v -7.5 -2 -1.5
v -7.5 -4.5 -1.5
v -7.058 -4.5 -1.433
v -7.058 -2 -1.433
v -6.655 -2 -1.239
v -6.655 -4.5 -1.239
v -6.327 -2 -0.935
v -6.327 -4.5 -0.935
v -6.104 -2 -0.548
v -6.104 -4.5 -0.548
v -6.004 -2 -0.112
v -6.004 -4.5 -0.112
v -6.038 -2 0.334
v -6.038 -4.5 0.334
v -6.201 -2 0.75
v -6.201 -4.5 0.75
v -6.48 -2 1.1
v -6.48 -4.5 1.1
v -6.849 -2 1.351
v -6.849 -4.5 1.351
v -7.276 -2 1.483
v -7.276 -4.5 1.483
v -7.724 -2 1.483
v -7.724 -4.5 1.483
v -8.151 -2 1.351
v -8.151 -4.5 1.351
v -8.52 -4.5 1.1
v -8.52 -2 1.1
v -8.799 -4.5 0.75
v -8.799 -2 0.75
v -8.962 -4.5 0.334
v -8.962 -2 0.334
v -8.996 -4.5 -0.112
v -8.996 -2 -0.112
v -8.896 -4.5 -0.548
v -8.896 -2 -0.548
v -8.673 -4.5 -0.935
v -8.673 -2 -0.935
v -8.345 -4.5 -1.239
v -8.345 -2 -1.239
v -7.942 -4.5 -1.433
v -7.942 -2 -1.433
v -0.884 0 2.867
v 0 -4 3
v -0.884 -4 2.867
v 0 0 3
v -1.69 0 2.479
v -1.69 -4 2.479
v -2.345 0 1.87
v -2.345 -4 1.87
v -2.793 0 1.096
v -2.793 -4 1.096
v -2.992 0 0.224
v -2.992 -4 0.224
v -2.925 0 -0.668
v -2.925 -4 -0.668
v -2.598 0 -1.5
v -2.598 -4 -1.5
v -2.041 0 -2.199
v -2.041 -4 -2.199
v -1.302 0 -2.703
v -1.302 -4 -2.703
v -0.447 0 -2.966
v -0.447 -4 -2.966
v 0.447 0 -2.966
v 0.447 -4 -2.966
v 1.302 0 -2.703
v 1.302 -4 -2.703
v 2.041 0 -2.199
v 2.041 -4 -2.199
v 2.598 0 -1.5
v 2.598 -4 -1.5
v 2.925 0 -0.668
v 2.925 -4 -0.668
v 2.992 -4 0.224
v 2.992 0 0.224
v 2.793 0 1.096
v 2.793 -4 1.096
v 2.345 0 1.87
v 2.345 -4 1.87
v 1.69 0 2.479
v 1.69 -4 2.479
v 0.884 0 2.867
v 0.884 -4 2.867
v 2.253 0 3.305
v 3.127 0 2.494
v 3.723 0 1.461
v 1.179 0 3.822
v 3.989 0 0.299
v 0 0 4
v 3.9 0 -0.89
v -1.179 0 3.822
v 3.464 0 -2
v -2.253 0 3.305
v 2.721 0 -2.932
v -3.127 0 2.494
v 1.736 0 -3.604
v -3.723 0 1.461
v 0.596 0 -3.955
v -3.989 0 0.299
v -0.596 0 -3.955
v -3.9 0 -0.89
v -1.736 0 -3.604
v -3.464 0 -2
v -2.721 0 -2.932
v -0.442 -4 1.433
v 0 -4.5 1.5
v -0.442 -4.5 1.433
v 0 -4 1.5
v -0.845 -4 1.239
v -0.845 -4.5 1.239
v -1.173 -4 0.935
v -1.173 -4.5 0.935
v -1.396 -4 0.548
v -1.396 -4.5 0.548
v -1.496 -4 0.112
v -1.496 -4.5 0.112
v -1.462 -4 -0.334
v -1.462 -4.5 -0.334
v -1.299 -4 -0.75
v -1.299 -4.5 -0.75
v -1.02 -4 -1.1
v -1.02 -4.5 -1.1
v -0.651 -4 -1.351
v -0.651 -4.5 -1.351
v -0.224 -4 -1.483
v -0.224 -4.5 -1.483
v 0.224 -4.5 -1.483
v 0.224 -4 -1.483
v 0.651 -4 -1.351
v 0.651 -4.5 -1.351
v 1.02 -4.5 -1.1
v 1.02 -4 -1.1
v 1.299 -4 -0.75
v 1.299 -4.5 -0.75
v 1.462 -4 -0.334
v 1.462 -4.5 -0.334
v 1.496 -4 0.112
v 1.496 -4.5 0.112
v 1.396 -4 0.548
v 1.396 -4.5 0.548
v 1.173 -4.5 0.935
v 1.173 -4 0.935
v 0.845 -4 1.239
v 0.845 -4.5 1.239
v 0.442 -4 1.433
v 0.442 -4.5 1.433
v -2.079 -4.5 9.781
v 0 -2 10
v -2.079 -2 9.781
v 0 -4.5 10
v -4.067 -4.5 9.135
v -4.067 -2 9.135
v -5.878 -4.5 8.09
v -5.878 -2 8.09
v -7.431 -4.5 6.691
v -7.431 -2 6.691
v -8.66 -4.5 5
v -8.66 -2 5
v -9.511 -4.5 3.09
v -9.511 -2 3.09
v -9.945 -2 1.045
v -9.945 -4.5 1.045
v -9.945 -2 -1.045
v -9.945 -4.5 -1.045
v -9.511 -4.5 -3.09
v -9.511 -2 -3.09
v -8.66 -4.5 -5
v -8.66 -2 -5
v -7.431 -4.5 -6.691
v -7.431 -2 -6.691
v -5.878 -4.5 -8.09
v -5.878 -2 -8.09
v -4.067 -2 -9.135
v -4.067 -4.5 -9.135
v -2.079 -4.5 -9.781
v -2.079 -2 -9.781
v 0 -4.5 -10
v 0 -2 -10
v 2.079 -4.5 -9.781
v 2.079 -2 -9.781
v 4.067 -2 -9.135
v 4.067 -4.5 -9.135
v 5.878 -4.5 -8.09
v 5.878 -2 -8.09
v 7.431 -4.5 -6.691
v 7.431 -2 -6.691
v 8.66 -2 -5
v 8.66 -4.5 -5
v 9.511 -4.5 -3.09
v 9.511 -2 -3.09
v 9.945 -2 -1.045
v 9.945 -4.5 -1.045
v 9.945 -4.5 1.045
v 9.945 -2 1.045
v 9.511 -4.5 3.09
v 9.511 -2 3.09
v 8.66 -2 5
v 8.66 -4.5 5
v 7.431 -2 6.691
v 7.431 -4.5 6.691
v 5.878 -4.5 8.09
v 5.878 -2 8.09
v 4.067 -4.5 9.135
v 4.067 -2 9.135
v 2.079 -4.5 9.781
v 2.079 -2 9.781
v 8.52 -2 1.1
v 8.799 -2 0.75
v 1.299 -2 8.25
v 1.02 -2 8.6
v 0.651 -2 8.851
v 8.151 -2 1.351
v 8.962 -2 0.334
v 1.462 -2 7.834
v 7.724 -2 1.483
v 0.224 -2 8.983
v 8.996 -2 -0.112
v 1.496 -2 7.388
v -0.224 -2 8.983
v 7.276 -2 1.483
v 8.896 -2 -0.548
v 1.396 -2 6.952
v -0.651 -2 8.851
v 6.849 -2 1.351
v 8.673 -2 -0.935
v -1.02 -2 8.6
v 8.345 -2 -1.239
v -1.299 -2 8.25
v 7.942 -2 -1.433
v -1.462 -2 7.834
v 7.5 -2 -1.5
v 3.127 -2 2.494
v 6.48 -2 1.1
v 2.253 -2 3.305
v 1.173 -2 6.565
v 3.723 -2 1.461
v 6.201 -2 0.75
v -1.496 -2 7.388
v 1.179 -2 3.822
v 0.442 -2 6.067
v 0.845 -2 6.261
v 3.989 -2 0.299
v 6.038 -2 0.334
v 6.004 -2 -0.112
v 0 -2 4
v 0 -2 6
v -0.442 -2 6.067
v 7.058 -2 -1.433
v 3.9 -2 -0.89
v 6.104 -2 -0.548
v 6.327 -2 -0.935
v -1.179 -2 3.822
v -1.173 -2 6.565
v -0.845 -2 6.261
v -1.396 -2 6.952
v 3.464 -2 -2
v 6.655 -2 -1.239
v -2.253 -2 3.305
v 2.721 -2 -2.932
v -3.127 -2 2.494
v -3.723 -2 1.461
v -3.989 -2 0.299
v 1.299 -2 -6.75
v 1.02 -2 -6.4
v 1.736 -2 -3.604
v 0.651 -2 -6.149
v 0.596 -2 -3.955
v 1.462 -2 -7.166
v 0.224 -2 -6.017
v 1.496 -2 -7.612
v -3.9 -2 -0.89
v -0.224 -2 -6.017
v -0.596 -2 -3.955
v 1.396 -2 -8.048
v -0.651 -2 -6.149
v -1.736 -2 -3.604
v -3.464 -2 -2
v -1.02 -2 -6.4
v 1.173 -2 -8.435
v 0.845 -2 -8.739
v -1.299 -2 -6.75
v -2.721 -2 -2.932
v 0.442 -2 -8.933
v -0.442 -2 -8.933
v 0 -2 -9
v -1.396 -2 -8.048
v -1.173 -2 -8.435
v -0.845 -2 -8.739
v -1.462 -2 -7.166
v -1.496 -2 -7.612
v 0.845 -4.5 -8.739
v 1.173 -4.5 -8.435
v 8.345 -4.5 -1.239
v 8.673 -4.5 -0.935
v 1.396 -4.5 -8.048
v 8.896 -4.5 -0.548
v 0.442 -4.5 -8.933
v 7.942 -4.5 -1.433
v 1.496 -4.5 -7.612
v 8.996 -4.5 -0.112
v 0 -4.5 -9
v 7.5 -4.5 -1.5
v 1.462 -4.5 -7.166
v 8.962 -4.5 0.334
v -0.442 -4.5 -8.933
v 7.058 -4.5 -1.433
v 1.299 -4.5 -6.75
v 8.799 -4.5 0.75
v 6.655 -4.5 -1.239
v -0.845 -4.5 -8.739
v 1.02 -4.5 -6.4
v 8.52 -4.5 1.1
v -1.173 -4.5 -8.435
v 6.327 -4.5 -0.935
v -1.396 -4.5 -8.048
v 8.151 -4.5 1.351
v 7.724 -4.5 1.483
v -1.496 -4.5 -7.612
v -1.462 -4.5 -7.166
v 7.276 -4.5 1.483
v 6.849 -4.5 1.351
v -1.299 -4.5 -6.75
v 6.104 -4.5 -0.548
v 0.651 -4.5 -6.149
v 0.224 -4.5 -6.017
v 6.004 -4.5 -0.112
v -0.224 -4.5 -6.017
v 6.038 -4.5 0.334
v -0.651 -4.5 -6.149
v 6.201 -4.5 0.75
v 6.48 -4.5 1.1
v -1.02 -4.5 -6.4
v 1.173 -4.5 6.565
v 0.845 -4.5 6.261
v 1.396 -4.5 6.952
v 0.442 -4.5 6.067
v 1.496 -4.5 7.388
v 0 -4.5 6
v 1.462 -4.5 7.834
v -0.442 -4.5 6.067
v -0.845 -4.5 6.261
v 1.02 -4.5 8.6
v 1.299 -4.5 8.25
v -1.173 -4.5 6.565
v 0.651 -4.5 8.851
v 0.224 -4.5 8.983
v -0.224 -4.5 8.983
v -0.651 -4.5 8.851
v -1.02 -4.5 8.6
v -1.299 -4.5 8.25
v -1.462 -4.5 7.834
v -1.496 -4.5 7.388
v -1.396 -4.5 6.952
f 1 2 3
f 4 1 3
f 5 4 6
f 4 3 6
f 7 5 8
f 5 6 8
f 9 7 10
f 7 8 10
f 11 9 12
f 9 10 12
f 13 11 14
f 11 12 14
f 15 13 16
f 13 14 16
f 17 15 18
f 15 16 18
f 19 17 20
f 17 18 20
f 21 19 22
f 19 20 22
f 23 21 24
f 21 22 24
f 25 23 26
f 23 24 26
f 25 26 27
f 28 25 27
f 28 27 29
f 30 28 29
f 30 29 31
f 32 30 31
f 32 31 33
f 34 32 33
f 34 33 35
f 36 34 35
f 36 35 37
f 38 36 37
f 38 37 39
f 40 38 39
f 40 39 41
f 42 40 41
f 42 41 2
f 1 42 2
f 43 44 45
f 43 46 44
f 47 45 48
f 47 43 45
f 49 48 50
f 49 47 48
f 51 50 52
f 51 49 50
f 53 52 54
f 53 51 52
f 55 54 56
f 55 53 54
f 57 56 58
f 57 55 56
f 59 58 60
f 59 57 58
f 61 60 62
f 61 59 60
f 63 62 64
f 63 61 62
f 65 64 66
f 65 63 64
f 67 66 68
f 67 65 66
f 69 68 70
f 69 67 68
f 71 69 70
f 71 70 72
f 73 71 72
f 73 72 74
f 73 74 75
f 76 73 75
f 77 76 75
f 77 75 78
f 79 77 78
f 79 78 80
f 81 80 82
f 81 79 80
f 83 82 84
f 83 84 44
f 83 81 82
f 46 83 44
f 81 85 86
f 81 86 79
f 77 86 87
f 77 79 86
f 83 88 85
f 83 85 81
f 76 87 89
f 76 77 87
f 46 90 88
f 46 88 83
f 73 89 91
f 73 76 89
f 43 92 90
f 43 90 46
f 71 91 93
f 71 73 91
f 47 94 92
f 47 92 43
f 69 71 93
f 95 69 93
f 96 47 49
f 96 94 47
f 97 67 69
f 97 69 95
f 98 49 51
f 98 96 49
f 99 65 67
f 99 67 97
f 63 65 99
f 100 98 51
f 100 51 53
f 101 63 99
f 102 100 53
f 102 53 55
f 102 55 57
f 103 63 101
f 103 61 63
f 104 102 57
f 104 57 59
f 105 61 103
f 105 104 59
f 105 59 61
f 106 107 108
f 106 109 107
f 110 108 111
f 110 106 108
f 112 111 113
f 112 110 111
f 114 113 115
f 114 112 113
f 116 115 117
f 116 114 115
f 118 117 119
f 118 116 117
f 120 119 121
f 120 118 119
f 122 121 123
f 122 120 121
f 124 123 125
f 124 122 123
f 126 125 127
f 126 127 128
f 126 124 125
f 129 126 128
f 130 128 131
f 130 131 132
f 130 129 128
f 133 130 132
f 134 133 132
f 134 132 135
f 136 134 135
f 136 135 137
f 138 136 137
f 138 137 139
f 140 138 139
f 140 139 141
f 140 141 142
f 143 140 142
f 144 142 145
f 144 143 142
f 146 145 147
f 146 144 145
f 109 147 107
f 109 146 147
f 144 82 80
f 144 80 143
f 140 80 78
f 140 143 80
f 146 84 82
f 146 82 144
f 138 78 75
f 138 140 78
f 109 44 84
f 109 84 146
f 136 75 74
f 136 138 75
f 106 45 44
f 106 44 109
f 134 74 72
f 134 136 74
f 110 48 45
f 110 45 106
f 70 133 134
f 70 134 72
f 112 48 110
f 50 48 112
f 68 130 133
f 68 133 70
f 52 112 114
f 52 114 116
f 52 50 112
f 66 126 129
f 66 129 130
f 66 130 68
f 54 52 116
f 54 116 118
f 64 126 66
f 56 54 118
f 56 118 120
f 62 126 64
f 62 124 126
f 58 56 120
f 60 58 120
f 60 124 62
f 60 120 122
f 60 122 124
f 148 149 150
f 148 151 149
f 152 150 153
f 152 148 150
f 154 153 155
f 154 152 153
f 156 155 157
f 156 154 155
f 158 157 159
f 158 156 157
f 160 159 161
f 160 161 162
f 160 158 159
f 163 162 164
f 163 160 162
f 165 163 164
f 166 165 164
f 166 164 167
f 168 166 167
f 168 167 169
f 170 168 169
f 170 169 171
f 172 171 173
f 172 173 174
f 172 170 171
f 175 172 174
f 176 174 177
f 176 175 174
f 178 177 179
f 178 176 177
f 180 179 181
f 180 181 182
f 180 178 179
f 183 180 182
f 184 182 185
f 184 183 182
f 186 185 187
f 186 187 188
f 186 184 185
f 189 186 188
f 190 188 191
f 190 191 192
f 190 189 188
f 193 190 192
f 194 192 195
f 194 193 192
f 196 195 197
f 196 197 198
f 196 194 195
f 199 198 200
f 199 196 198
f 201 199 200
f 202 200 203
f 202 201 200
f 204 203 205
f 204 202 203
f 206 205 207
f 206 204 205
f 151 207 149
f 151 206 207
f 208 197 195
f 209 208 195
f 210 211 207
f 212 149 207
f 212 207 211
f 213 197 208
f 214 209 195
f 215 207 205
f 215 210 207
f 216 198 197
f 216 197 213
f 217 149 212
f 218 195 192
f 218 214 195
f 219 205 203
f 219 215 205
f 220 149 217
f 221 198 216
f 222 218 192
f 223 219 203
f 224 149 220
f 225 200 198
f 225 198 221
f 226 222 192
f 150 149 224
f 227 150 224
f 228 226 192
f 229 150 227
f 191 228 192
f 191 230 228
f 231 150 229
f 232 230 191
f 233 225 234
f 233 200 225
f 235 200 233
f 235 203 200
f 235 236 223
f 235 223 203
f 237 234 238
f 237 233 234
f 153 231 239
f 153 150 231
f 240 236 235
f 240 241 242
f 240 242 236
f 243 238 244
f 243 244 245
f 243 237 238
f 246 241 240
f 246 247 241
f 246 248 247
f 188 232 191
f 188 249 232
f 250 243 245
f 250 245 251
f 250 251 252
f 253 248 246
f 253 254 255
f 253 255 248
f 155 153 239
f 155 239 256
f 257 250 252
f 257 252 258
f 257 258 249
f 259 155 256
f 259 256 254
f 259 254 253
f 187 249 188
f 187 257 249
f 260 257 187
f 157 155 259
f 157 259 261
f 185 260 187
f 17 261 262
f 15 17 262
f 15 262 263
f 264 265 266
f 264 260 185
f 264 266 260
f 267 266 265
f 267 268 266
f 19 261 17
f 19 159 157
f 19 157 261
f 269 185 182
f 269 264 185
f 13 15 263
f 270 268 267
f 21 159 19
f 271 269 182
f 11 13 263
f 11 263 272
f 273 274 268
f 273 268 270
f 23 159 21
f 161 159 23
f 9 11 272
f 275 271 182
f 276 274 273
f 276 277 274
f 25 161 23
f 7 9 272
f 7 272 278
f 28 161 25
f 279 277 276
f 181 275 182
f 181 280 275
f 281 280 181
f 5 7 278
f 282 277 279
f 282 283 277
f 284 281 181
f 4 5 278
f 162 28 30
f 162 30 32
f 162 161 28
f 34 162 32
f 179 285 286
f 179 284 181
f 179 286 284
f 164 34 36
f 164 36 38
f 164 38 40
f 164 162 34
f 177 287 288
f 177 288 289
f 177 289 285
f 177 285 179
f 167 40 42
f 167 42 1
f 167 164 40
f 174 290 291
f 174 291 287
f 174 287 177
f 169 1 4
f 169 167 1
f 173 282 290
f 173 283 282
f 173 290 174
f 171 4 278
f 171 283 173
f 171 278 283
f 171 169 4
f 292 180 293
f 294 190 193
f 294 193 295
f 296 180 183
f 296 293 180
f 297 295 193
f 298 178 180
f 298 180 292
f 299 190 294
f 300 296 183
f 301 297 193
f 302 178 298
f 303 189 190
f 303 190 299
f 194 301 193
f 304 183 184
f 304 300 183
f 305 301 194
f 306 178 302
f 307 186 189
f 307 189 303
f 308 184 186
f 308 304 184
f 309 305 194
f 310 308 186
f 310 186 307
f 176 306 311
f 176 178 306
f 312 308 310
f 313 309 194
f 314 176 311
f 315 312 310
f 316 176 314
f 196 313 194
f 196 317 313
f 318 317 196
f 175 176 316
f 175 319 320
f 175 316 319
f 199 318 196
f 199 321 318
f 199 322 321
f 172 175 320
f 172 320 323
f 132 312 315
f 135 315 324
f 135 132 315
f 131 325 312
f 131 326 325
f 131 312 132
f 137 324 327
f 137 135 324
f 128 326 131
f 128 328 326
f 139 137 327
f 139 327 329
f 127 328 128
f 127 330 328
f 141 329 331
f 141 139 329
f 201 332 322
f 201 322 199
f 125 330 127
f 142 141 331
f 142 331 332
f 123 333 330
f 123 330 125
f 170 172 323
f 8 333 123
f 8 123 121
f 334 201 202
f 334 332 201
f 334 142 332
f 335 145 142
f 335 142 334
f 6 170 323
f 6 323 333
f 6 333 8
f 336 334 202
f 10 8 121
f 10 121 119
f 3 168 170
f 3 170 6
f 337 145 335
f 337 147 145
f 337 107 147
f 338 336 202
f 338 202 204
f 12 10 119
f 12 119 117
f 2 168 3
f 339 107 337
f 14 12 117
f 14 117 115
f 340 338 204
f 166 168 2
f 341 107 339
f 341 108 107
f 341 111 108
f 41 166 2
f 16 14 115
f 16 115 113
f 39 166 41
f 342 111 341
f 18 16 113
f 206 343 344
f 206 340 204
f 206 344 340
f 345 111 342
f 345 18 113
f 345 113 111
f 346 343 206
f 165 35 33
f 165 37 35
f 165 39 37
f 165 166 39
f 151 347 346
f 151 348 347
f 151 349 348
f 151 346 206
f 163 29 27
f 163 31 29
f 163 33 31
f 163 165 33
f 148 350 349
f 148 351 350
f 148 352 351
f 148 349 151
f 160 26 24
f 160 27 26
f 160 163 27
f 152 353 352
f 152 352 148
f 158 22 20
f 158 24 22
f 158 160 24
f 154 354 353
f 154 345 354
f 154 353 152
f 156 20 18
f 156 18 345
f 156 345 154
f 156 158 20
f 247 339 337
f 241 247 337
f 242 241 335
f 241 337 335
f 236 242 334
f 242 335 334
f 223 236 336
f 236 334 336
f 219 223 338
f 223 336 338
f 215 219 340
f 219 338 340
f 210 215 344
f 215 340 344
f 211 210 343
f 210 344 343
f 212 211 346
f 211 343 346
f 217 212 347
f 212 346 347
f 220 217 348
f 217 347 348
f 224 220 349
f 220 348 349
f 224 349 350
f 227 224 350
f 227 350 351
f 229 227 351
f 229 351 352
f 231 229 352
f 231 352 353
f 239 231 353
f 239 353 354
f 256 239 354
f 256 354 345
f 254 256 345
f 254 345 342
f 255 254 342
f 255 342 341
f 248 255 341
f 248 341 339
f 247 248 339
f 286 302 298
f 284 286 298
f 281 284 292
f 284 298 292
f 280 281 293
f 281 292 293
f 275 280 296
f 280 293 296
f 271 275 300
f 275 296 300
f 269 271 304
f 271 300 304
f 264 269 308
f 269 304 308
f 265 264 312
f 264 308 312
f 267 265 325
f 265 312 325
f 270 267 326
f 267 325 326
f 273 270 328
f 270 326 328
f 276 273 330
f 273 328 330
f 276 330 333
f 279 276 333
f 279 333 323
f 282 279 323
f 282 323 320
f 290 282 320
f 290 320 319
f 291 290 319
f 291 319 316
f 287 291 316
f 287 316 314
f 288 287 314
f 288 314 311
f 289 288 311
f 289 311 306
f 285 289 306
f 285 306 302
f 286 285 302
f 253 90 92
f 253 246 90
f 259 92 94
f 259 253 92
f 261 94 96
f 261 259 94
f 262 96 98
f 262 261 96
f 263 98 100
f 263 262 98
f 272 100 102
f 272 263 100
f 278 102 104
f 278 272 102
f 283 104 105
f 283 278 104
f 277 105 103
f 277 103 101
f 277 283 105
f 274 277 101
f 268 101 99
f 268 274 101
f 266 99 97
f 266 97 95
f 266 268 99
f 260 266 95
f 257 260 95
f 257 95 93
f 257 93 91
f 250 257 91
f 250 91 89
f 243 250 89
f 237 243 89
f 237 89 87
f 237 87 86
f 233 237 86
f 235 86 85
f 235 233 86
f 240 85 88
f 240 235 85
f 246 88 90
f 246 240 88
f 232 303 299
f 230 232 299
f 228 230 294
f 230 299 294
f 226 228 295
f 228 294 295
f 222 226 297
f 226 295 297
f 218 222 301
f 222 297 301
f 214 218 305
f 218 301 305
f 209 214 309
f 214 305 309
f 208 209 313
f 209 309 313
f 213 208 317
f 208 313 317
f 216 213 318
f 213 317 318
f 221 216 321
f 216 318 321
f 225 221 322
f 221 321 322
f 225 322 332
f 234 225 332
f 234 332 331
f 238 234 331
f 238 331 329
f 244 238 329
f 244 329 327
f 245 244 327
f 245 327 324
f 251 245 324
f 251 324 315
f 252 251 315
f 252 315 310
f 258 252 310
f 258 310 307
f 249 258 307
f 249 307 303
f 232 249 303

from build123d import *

# Parameters (mm, degrees)
SKETCH2_R          = 1.5
CUT_EXTRUDE1_DEPTH = 10


with BuildPart() as part:
    # Sketch1 → Revolve1 (revolve)
    with BuildSketch(Plane.XY, mode=Mode.PRIVATE) as revolve1_sk:
        Polygon((3, 0), (4, 0), (4, -2), (10, -2), (10, -4.5), (1.5, -4.5), (1.5, -4), (3, -4), align=None)
    revolve(revolve1_sk.sketch.rotate(Axis((0, 3.424478083, 0), (0, -1, 0)), 90), axis=Axis((0, 3.424478083, 0), (0, -1, 0)))

    # Sketch2 → Cut-Extrude1 (cut)
    with BuildSketch(Plane.XZ.offset(4.5)):
        with Locations(Location((0, -7.5, 0), (0, 0, 270))):
            Circle(SKETCH2_R)
        with Locations(Location((-7.5, 0, 0), (0, 0, 270))):
            Circle(SKETCH2_R)
        with Locations(Location((0, 7.5, 0), (0, 0, 270))):
            Circle(SKETCH2_R)
        with Locations(Location((7.5, 0, 0), (0, 0, 270))):
            Circle(SKETCH2_R)
    extrude(amount=-CUT_EXTRUDE1_DEPTH, mode=Mode.SUBTRACT)


solid = part.part
